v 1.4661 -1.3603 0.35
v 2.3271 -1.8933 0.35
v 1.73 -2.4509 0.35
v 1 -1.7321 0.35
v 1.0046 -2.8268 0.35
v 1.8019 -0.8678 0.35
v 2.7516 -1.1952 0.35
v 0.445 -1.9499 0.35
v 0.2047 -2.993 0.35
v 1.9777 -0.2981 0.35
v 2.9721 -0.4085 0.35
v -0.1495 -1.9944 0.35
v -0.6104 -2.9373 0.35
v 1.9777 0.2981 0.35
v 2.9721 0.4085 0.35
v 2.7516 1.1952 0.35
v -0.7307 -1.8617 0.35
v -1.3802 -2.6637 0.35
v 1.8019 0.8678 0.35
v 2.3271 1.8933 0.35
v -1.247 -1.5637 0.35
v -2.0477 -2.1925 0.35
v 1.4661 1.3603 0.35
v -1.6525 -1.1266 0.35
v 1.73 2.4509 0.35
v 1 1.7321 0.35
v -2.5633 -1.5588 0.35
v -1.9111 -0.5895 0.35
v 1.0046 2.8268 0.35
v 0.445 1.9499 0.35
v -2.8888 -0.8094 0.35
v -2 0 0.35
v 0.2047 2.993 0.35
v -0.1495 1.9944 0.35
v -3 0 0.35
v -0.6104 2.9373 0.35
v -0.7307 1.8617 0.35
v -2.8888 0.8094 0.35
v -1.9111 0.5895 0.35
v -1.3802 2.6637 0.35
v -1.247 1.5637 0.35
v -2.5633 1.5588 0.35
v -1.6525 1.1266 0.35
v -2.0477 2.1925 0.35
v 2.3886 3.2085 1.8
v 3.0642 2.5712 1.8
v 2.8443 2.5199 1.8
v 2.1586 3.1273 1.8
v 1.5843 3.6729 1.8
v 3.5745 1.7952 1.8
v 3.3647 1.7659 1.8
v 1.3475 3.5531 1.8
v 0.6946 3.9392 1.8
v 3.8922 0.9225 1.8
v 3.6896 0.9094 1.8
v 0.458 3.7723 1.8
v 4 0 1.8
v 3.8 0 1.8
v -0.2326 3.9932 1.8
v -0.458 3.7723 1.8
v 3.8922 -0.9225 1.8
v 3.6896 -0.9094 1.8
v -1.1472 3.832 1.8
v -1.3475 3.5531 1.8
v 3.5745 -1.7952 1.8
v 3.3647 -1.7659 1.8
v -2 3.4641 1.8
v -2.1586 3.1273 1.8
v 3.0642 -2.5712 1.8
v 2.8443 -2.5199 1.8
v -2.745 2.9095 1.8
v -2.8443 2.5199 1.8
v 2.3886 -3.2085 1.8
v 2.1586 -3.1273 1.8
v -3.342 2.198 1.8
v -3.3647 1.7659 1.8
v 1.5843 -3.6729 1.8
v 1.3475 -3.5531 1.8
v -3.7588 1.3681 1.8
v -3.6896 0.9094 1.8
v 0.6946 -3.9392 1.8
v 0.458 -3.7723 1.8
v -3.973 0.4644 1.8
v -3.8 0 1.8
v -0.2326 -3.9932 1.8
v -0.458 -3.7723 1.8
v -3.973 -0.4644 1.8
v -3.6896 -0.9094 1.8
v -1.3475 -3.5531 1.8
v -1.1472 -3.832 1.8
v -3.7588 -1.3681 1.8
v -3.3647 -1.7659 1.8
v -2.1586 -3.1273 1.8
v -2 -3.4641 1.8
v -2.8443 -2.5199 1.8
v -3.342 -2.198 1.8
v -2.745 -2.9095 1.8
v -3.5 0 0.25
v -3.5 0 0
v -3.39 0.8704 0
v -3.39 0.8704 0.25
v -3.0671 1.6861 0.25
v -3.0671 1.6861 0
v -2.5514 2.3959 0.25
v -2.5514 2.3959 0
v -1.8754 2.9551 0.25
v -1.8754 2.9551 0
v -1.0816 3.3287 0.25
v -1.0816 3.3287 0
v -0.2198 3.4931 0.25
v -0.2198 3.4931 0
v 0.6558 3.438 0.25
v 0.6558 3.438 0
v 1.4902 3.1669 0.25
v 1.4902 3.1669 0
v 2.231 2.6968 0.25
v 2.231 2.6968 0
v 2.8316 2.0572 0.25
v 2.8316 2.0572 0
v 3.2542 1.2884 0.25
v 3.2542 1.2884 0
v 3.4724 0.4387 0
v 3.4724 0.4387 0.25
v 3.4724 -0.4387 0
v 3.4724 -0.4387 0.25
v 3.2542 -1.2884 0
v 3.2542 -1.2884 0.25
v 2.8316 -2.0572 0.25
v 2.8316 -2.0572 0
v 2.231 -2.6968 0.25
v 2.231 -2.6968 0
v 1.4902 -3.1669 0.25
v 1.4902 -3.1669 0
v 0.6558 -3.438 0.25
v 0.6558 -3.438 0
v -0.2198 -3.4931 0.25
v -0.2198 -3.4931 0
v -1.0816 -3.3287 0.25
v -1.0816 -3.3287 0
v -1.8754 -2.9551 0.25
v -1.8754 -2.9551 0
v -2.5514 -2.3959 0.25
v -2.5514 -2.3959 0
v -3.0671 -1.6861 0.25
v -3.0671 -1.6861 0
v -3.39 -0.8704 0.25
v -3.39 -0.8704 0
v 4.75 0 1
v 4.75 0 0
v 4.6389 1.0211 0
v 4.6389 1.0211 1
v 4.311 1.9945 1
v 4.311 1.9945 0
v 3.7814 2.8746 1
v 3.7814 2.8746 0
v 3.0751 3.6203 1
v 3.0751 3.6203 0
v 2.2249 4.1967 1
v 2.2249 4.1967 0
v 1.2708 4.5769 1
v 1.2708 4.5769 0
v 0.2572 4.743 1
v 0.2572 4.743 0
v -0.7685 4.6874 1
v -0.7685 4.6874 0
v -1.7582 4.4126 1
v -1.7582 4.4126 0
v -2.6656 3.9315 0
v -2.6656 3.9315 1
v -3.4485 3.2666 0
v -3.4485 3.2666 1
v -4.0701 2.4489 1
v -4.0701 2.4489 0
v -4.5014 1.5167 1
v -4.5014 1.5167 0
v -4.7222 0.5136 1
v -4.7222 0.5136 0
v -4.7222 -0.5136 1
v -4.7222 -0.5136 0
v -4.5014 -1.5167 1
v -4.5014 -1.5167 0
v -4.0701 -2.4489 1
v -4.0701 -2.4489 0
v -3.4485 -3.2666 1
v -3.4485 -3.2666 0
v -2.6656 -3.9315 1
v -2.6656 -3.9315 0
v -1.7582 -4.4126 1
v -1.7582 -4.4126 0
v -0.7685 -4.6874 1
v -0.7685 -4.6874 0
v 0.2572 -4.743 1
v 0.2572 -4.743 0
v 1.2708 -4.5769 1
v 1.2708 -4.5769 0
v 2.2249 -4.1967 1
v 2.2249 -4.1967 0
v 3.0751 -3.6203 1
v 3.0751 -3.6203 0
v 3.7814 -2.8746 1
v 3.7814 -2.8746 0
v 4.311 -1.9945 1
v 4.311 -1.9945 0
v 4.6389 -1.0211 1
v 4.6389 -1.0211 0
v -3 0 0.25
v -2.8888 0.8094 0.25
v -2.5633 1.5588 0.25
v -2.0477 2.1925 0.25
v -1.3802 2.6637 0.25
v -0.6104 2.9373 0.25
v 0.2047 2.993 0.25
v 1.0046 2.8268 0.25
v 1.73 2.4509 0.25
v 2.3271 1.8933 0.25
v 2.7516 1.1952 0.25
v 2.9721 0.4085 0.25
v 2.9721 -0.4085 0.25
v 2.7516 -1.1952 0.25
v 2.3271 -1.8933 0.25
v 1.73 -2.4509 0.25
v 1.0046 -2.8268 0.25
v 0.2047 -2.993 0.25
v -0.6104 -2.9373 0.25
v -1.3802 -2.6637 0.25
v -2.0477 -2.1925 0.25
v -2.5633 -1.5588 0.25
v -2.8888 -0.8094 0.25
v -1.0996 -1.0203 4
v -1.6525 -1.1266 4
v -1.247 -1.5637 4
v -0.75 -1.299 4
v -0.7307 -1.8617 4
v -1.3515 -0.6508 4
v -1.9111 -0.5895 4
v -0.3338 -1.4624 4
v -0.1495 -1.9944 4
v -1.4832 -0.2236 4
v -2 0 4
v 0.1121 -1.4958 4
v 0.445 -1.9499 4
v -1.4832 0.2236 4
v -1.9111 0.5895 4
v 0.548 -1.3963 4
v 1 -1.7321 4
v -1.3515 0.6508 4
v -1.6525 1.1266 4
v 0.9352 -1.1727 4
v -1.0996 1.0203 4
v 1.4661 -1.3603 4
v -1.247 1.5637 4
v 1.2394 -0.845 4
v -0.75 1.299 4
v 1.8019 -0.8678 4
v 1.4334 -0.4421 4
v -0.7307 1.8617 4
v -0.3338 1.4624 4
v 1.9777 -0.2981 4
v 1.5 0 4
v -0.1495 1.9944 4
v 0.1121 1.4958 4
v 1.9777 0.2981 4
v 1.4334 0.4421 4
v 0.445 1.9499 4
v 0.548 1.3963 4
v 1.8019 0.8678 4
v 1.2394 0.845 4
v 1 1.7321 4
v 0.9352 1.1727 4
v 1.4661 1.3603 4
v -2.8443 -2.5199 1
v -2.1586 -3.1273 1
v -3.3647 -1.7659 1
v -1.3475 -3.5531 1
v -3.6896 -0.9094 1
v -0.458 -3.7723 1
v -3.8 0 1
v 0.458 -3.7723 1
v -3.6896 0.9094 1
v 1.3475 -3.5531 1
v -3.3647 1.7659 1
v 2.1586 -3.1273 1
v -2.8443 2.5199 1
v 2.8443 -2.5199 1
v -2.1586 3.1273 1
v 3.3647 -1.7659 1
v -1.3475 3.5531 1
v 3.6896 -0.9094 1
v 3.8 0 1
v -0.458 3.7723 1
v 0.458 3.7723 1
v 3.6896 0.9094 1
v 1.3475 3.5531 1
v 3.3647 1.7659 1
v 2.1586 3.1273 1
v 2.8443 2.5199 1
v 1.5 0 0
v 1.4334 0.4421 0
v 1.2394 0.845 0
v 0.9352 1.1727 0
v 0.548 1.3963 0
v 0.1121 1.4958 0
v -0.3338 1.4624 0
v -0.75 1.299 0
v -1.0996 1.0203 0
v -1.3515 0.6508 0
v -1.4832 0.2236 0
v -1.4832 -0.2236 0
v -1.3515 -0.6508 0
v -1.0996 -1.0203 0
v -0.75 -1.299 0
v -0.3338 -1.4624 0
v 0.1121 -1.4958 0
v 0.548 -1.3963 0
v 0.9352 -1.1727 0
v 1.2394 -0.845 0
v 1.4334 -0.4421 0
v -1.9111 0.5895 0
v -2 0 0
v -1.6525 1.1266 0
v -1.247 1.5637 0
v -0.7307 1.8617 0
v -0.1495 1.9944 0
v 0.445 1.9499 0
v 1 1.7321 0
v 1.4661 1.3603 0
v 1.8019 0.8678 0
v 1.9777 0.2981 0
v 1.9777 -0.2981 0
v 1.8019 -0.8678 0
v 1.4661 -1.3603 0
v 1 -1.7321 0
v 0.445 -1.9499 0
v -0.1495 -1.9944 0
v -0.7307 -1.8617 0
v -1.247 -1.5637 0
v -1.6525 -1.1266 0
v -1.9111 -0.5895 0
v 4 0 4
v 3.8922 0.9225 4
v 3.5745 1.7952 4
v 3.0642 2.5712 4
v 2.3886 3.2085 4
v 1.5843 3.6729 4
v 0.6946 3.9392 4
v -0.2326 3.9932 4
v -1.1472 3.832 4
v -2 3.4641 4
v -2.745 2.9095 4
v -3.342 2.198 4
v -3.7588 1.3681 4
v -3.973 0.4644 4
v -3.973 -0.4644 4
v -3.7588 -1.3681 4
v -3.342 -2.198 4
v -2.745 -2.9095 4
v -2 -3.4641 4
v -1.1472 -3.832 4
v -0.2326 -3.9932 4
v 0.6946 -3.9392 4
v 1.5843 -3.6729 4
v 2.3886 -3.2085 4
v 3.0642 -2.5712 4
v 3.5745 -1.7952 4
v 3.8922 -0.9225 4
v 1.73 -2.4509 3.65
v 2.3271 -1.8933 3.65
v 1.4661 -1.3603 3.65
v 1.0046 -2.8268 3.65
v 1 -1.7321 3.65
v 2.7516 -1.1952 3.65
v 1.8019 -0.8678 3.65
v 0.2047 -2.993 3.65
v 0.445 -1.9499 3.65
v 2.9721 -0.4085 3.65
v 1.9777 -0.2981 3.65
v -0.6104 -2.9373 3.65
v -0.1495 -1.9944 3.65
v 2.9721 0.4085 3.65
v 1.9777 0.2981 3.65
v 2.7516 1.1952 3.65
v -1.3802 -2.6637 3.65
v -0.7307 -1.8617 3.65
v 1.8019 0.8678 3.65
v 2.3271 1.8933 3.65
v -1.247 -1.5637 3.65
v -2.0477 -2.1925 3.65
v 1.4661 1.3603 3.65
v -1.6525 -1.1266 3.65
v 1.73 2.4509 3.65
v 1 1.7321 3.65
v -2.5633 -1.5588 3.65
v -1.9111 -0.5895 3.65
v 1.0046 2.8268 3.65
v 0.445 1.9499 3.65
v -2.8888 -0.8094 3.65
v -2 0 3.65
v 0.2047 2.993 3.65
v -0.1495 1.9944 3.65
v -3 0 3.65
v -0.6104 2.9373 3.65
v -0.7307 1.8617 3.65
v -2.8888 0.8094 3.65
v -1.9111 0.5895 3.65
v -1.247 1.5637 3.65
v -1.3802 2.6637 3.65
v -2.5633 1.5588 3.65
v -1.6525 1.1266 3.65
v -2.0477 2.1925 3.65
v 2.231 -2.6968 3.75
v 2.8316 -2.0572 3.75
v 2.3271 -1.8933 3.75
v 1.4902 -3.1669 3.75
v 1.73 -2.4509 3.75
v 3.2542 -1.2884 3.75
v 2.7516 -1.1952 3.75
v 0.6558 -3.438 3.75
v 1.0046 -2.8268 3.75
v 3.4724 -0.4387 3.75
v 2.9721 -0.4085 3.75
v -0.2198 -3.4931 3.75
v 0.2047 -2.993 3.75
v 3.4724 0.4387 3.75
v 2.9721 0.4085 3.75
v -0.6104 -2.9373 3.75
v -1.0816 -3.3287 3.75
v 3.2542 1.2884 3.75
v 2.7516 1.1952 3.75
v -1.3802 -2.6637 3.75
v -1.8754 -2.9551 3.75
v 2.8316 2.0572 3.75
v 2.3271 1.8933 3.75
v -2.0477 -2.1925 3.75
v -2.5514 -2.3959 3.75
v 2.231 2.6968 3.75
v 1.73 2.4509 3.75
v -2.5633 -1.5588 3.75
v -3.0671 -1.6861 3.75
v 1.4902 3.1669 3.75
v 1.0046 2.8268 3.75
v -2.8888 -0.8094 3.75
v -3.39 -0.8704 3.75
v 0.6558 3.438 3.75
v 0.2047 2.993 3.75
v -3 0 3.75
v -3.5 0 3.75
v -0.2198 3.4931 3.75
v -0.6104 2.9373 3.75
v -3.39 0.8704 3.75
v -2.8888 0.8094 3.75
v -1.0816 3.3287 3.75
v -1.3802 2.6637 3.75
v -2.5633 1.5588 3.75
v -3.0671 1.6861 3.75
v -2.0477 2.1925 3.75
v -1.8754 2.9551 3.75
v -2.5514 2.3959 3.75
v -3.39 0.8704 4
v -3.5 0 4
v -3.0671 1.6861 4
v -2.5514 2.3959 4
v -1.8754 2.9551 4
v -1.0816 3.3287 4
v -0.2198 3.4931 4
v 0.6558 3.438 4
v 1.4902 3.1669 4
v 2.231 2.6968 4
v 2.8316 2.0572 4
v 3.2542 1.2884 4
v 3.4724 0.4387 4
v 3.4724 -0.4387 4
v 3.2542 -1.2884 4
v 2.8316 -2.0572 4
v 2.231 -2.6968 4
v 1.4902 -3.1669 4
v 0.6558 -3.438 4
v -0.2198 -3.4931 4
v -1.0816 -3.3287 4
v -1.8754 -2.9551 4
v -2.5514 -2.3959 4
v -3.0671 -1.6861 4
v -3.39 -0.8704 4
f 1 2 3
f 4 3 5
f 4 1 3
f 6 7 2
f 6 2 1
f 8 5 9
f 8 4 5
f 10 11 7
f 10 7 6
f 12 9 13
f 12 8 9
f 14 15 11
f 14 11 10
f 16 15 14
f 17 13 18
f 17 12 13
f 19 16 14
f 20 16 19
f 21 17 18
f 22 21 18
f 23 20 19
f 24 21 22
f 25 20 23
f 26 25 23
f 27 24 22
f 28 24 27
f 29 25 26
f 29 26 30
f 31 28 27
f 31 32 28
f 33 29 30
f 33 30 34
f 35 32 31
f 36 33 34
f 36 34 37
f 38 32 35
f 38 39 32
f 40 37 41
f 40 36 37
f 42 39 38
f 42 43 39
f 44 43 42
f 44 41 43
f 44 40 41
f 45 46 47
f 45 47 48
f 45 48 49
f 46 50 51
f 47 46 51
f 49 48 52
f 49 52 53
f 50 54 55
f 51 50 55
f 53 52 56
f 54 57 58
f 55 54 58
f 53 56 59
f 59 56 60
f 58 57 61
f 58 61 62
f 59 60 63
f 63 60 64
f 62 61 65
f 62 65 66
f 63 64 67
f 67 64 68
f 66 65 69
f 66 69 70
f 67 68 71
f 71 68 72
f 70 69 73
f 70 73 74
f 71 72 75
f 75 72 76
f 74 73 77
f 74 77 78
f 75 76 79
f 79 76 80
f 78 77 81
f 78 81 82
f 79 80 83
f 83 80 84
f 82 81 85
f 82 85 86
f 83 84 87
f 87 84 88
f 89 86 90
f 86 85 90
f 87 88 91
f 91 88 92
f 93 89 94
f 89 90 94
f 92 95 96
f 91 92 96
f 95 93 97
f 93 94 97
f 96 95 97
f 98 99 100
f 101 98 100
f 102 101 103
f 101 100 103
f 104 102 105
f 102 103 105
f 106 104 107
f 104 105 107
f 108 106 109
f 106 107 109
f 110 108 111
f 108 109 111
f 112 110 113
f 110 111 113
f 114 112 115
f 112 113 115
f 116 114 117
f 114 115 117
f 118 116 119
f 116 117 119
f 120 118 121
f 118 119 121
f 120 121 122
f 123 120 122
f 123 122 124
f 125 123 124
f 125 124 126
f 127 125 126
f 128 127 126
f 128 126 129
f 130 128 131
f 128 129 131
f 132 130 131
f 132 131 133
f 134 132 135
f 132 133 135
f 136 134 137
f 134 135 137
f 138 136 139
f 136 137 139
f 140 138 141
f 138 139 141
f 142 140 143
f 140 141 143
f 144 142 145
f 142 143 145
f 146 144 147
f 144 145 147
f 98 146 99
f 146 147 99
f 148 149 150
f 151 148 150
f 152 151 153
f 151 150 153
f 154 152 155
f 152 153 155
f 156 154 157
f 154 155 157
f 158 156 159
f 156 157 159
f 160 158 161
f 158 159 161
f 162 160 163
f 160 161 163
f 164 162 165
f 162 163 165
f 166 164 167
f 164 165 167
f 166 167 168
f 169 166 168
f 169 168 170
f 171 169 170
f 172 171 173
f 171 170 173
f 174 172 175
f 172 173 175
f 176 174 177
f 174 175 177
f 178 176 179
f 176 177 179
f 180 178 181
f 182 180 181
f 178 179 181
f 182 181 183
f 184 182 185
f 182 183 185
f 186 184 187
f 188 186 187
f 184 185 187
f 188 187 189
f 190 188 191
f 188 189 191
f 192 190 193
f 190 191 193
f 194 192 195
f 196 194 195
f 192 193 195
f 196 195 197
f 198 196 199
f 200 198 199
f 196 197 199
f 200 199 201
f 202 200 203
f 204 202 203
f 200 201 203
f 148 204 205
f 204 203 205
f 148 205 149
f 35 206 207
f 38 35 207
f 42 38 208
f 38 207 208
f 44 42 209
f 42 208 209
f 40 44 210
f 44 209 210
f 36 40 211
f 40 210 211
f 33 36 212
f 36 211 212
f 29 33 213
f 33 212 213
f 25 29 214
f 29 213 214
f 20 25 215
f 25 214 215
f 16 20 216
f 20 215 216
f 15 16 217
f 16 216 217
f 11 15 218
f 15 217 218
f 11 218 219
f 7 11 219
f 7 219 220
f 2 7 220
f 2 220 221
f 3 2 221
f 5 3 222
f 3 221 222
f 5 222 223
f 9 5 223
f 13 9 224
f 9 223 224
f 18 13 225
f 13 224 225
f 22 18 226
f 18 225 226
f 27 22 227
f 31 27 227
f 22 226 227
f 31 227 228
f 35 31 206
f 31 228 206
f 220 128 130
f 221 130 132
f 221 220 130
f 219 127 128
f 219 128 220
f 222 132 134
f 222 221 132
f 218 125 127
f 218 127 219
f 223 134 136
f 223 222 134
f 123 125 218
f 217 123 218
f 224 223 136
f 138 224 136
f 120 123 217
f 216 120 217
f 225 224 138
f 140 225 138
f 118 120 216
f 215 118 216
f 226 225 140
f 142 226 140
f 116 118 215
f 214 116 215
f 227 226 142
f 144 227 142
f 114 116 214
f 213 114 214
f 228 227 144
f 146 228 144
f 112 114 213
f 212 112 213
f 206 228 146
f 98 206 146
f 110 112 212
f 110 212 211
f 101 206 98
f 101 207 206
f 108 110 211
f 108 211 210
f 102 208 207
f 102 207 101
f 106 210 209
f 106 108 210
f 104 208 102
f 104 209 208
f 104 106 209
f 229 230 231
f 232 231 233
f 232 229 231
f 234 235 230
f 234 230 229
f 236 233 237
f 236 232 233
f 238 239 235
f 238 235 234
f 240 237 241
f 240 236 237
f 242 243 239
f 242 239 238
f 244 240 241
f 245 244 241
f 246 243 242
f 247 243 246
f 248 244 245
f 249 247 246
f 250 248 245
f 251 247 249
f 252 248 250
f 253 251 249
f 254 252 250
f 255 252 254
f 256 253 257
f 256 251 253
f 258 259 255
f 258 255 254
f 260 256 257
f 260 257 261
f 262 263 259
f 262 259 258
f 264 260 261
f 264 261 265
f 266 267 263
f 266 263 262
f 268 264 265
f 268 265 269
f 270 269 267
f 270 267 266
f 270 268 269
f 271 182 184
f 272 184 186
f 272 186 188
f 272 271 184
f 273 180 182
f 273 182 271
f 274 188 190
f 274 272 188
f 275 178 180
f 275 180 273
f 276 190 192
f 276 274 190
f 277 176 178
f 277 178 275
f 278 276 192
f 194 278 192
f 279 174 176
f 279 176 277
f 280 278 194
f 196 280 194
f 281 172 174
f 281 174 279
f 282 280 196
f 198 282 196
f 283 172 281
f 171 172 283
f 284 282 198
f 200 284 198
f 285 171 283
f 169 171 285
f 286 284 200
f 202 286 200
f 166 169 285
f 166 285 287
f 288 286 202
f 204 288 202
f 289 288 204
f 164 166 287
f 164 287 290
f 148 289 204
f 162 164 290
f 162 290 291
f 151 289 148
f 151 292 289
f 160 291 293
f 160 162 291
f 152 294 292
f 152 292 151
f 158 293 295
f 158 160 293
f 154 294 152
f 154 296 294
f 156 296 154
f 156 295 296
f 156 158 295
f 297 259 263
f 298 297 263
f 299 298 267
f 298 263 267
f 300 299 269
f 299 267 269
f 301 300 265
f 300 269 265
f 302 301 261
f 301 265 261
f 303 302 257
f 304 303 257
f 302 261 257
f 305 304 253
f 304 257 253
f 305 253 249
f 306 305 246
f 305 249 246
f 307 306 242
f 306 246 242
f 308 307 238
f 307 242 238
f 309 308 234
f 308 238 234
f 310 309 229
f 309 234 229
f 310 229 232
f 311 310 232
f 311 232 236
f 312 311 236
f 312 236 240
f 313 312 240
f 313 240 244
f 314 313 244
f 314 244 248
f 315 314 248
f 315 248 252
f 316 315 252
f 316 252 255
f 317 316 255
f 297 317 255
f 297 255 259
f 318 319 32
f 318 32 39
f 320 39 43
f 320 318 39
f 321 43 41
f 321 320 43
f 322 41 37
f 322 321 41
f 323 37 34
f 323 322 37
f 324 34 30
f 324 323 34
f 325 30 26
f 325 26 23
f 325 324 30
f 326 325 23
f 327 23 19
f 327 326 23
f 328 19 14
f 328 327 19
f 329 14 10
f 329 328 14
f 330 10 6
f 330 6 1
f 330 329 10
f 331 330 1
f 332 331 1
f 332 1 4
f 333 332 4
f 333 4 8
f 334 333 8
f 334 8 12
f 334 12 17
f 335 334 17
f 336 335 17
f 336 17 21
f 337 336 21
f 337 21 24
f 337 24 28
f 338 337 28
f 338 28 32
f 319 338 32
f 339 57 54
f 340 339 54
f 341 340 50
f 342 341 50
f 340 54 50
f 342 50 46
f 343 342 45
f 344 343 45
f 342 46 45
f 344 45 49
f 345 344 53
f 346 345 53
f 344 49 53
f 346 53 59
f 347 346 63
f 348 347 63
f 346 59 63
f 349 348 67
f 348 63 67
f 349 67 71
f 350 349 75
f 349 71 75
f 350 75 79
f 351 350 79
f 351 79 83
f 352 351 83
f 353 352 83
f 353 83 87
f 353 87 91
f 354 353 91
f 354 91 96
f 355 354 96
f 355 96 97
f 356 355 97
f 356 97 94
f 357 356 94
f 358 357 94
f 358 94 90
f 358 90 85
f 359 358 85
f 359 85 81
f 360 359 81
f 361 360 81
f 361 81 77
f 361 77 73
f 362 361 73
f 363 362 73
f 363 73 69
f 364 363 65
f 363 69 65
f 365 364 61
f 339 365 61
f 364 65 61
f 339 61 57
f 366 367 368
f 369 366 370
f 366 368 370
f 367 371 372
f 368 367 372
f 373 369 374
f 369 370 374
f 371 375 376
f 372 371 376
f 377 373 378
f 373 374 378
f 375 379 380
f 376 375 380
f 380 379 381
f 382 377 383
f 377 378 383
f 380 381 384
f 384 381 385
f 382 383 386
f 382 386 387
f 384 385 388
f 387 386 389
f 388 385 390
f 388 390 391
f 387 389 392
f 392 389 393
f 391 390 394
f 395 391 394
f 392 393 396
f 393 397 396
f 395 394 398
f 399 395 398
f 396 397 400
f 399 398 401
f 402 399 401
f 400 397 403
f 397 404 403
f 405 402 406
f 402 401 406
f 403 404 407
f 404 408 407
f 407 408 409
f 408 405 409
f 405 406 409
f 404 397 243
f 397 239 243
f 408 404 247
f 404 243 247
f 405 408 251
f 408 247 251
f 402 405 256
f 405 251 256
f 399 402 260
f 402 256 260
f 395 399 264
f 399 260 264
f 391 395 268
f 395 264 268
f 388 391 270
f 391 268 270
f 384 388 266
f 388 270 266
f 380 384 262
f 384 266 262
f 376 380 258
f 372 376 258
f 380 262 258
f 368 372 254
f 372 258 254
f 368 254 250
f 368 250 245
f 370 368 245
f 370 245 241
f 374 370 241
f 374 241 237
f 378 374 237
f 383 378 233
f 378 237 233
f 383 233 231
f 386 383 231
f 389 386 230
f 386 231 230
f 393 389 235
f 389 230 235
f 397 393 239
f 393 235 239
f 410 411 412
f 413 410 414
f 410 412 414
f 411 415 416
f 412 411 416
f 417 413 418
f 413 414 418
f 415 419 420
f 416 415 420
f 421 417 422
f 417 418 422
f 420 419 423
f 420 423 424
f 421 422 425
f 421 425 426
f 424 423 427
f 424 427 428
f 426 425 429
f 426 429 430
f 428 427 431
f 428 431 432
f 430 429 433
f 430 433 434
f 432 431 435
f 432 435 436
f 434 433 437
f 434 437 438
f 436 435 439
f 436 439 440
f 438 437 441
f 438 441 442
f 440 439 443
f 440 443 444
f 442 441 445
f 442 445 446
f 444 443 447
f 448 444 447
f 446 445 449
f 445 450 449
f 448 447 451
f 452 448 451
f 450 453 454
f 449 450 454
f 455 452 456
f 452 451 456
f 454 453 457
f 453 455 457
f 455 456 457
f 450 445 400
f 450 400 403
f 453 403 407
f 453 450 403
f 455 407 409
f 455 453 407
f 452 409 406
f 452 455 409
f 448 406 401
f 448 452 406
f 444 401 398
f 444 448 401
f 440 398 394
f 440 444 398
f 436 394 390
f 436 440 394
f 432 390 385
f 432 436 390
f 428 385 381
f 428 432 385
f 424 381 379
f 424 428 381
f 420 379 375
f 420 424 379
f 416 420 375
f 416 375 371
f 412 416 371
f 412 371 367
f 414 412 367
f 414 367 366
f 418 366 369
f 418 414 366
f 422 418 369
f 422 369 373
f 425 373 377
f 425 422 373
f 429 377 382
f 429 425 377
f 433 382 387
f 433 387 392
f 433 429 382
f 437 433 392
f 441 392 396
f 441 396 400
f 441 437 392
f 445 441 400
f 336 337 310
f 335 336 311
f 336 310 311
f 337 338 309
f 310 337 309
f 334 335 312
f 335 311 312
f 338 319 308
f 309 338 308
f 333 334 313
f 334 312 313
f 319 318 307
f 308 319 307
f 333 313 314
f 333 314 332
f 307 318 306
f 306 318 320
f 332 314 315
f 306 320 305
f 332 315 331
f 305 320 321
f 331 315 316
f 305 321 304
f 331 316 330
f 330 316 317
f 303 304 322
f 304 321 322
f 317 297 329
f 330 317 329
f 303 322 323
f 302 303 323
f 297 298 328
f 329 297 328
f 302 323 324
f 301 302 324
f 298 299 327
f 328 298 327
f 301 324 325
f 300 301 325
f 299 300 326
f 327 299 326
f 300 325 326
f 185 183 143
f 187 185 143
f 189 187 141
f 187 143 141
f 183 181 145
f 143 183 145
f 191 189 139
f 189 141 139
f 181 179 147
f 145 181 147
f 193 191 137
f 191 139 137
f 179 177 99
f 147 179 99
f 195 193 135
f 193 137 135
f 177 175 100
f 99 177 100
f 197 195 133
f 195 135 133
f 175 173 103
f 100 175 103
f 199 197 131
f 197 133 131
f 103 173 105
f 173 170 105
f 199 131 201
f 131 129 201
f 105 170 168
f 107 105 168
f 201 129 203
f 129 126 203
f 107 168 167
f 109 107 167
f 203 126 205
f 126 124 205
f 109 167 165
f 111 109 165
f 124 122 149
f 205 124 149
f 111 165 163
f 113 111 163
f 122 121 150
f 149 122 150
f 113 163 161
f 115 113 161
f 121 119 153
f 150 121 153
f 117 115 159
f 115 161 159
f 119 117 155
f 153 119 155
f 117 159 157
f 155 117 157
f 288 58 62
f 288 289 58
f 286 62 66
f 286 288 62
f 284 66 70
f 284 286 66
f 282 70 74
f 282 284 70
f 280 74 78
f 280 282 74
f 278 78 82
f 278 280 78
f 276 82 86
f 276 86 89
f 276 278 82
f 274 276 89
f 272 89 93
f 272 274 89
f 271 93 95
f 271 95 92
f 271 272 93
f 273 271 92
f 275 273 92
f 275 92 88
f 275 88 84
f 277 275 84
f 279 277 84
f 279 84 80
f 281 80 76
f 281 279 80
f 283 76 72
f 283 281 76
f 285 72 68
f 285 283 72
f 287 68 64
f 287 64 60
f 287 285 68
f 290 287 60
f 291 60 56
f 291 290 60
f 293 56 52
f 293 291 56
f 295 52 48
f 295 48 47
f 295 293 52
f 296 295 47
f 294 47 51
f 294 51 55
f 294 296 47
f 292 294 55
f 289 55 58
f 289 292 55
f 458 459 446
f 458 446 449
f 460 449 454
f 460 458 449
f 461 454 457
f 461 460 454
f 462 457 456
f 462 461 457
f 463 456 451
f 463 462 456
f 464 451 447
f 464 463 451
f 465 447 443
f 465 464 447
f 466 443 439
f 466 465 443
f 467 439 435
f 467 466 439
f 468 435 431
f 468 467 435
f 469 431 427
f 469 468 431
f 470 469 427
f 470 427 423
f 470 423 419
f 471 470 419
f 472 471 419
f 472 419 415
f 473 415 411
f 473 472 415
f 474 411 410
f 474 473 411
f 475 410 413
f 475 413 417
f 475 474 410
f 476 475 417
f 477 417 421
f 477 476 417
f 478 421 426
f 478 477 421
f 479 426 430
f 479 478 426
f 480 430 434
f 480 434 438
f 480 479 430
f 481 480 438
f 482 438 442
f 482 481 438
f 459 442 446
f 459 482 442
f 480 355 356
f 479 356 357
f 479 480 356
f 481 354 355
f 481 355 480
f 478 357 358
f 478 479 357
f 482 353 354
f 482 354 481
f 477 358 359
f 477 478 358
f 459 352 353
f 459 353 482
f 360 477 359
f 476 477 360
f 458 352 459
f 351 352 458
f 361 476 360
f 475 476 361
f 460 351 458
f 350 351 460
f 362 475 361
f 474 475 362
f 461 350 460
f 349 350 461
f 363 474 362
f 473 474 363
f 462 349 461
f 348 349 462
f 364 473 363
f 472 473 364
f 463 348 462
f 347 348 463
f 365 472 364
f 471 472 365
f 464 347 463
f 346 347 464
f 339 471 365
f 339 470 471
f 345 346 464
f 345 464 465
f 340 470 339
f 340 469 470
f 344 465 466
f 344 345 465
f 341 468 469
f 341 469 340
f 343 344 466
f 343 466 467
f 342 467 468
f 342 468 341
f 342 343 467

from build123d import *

# Parameters (mm, degrees)
SCHIZZO1_R                   = 4
ESTRUSIONE_ESTRUSIONE1_DEPTH = 4
SCHIZZO2_R                   = 1.5
TAGLIO_ESTRUSIONE1_DEPTH     = 5
SCHIZZO3_R                   = 3.5
SCHIZZO3_R_2                 = 2
TAGLIO_ESTRUSIONE2_DEPTH     = 0.25
SCHIZZO4_R                   = 3
SCHIZZO4_R_2                 = 2
TAGLIO_ESTRUSIONE3_DEPTH     = 0.1
SCHIZZO5_R                   = 4.75
SCHIZZO5_R_2                 = 4
ESTRUSIONE_ESTRUSIONE2_DEPTH = 1
SCHIZZO6_W                   = 0.2
SCHIZZO6_H                   = 0.8


with BuildPart() as part:
    # Schizzo1 → Estrusione-Estrusione1 (new body)
    with BuildSketch(Plane.XY):
        Circle(SCHIZZO1_R)
    extrude(amount=ESTRUSIONE_ESTRUSIONE1_DEPTH)

    # Schizzo2 → Taglio-Estrusione1 (cut, through all)
    with BuildSketch(Plane.XY.offset(4)):
        Circle(SCHIZZO2_R)
    extrude(amount=-TAGLIO_ESTRUSIONE1_DEPTH, mode=Mode.SUBTRACT)

    # Schizzo3 → Taglio-Estrusione2 (cut)
    with BuildSketch(Plane(origin=(0, 0, 0), x_dir=(-1, 0, 0), z_dir=(0, 0, -1))):
        Circle(SCHIZZO3_R)
        Circle(SCHIZZO3_R_2, mode=Mode.SUBTRACT)
    taglio_estrusione2 = extrude(amount=-TAGLIO_ESTRUSIONE2_DEPTH, mode=Mode.SUBTRACT)

    # Schizzo4 → Taglio-Estrusione3 (cut)
    with BuildSketch(Plane(origin=(0, 0, 0.25), x_dir=(-1, 0, 0), z_dir=(0, 0, -1))):
        Circle(SCHIZZO4_R)
        Circle(SCHIZZO4_R_2, mode=Mode.SUBTRACT)
    taglio_estrusione3 = extrude(amount=-TAGLIO_ESTRUSIONE3_DEPTH, mode=Mode.SUBTRACT)

    # Specchia1: Taglio-Estrusione2, Taglio-Estrusione3 across plane
    add(taglio_estrusione2.mirror(Plane.XY.offset(2)), mode=Mode.SUBTRACT)
    add(taglio_estrusione3.mirror(Plane.XY.offset(2)), mode=Mode.SUBTRACT)

    # Schizzo5 → Estrusione-Estrusione2 (add)
    with BuildSketch(Plane.XY):
        Circle(SCHIZZO5_R)
        Circle(SCHIZZO5_R_2, mode=Mode.SUBTRACT)
    extrude(amount=ESTRUSIONE_ESTRUSIONE2_DEPTH)

    # Schizzo6 → Taglia-Rivoluzione1 (revolve, cut)
    with BuildSketch(Plane(origin=(0, 0, 0), x_dir=(1, 0, 0), z_dir=(0, 1, 0))):
        with Locations((3.9, -1.4)):
            Rectangle(SCHIZZO6_W, SCHIZZO6_H)
    revolve(axis=Axis((0, 0, 4), (0, 0, -1)), mode=Mode.SUBTRACT)


solid = part.part
